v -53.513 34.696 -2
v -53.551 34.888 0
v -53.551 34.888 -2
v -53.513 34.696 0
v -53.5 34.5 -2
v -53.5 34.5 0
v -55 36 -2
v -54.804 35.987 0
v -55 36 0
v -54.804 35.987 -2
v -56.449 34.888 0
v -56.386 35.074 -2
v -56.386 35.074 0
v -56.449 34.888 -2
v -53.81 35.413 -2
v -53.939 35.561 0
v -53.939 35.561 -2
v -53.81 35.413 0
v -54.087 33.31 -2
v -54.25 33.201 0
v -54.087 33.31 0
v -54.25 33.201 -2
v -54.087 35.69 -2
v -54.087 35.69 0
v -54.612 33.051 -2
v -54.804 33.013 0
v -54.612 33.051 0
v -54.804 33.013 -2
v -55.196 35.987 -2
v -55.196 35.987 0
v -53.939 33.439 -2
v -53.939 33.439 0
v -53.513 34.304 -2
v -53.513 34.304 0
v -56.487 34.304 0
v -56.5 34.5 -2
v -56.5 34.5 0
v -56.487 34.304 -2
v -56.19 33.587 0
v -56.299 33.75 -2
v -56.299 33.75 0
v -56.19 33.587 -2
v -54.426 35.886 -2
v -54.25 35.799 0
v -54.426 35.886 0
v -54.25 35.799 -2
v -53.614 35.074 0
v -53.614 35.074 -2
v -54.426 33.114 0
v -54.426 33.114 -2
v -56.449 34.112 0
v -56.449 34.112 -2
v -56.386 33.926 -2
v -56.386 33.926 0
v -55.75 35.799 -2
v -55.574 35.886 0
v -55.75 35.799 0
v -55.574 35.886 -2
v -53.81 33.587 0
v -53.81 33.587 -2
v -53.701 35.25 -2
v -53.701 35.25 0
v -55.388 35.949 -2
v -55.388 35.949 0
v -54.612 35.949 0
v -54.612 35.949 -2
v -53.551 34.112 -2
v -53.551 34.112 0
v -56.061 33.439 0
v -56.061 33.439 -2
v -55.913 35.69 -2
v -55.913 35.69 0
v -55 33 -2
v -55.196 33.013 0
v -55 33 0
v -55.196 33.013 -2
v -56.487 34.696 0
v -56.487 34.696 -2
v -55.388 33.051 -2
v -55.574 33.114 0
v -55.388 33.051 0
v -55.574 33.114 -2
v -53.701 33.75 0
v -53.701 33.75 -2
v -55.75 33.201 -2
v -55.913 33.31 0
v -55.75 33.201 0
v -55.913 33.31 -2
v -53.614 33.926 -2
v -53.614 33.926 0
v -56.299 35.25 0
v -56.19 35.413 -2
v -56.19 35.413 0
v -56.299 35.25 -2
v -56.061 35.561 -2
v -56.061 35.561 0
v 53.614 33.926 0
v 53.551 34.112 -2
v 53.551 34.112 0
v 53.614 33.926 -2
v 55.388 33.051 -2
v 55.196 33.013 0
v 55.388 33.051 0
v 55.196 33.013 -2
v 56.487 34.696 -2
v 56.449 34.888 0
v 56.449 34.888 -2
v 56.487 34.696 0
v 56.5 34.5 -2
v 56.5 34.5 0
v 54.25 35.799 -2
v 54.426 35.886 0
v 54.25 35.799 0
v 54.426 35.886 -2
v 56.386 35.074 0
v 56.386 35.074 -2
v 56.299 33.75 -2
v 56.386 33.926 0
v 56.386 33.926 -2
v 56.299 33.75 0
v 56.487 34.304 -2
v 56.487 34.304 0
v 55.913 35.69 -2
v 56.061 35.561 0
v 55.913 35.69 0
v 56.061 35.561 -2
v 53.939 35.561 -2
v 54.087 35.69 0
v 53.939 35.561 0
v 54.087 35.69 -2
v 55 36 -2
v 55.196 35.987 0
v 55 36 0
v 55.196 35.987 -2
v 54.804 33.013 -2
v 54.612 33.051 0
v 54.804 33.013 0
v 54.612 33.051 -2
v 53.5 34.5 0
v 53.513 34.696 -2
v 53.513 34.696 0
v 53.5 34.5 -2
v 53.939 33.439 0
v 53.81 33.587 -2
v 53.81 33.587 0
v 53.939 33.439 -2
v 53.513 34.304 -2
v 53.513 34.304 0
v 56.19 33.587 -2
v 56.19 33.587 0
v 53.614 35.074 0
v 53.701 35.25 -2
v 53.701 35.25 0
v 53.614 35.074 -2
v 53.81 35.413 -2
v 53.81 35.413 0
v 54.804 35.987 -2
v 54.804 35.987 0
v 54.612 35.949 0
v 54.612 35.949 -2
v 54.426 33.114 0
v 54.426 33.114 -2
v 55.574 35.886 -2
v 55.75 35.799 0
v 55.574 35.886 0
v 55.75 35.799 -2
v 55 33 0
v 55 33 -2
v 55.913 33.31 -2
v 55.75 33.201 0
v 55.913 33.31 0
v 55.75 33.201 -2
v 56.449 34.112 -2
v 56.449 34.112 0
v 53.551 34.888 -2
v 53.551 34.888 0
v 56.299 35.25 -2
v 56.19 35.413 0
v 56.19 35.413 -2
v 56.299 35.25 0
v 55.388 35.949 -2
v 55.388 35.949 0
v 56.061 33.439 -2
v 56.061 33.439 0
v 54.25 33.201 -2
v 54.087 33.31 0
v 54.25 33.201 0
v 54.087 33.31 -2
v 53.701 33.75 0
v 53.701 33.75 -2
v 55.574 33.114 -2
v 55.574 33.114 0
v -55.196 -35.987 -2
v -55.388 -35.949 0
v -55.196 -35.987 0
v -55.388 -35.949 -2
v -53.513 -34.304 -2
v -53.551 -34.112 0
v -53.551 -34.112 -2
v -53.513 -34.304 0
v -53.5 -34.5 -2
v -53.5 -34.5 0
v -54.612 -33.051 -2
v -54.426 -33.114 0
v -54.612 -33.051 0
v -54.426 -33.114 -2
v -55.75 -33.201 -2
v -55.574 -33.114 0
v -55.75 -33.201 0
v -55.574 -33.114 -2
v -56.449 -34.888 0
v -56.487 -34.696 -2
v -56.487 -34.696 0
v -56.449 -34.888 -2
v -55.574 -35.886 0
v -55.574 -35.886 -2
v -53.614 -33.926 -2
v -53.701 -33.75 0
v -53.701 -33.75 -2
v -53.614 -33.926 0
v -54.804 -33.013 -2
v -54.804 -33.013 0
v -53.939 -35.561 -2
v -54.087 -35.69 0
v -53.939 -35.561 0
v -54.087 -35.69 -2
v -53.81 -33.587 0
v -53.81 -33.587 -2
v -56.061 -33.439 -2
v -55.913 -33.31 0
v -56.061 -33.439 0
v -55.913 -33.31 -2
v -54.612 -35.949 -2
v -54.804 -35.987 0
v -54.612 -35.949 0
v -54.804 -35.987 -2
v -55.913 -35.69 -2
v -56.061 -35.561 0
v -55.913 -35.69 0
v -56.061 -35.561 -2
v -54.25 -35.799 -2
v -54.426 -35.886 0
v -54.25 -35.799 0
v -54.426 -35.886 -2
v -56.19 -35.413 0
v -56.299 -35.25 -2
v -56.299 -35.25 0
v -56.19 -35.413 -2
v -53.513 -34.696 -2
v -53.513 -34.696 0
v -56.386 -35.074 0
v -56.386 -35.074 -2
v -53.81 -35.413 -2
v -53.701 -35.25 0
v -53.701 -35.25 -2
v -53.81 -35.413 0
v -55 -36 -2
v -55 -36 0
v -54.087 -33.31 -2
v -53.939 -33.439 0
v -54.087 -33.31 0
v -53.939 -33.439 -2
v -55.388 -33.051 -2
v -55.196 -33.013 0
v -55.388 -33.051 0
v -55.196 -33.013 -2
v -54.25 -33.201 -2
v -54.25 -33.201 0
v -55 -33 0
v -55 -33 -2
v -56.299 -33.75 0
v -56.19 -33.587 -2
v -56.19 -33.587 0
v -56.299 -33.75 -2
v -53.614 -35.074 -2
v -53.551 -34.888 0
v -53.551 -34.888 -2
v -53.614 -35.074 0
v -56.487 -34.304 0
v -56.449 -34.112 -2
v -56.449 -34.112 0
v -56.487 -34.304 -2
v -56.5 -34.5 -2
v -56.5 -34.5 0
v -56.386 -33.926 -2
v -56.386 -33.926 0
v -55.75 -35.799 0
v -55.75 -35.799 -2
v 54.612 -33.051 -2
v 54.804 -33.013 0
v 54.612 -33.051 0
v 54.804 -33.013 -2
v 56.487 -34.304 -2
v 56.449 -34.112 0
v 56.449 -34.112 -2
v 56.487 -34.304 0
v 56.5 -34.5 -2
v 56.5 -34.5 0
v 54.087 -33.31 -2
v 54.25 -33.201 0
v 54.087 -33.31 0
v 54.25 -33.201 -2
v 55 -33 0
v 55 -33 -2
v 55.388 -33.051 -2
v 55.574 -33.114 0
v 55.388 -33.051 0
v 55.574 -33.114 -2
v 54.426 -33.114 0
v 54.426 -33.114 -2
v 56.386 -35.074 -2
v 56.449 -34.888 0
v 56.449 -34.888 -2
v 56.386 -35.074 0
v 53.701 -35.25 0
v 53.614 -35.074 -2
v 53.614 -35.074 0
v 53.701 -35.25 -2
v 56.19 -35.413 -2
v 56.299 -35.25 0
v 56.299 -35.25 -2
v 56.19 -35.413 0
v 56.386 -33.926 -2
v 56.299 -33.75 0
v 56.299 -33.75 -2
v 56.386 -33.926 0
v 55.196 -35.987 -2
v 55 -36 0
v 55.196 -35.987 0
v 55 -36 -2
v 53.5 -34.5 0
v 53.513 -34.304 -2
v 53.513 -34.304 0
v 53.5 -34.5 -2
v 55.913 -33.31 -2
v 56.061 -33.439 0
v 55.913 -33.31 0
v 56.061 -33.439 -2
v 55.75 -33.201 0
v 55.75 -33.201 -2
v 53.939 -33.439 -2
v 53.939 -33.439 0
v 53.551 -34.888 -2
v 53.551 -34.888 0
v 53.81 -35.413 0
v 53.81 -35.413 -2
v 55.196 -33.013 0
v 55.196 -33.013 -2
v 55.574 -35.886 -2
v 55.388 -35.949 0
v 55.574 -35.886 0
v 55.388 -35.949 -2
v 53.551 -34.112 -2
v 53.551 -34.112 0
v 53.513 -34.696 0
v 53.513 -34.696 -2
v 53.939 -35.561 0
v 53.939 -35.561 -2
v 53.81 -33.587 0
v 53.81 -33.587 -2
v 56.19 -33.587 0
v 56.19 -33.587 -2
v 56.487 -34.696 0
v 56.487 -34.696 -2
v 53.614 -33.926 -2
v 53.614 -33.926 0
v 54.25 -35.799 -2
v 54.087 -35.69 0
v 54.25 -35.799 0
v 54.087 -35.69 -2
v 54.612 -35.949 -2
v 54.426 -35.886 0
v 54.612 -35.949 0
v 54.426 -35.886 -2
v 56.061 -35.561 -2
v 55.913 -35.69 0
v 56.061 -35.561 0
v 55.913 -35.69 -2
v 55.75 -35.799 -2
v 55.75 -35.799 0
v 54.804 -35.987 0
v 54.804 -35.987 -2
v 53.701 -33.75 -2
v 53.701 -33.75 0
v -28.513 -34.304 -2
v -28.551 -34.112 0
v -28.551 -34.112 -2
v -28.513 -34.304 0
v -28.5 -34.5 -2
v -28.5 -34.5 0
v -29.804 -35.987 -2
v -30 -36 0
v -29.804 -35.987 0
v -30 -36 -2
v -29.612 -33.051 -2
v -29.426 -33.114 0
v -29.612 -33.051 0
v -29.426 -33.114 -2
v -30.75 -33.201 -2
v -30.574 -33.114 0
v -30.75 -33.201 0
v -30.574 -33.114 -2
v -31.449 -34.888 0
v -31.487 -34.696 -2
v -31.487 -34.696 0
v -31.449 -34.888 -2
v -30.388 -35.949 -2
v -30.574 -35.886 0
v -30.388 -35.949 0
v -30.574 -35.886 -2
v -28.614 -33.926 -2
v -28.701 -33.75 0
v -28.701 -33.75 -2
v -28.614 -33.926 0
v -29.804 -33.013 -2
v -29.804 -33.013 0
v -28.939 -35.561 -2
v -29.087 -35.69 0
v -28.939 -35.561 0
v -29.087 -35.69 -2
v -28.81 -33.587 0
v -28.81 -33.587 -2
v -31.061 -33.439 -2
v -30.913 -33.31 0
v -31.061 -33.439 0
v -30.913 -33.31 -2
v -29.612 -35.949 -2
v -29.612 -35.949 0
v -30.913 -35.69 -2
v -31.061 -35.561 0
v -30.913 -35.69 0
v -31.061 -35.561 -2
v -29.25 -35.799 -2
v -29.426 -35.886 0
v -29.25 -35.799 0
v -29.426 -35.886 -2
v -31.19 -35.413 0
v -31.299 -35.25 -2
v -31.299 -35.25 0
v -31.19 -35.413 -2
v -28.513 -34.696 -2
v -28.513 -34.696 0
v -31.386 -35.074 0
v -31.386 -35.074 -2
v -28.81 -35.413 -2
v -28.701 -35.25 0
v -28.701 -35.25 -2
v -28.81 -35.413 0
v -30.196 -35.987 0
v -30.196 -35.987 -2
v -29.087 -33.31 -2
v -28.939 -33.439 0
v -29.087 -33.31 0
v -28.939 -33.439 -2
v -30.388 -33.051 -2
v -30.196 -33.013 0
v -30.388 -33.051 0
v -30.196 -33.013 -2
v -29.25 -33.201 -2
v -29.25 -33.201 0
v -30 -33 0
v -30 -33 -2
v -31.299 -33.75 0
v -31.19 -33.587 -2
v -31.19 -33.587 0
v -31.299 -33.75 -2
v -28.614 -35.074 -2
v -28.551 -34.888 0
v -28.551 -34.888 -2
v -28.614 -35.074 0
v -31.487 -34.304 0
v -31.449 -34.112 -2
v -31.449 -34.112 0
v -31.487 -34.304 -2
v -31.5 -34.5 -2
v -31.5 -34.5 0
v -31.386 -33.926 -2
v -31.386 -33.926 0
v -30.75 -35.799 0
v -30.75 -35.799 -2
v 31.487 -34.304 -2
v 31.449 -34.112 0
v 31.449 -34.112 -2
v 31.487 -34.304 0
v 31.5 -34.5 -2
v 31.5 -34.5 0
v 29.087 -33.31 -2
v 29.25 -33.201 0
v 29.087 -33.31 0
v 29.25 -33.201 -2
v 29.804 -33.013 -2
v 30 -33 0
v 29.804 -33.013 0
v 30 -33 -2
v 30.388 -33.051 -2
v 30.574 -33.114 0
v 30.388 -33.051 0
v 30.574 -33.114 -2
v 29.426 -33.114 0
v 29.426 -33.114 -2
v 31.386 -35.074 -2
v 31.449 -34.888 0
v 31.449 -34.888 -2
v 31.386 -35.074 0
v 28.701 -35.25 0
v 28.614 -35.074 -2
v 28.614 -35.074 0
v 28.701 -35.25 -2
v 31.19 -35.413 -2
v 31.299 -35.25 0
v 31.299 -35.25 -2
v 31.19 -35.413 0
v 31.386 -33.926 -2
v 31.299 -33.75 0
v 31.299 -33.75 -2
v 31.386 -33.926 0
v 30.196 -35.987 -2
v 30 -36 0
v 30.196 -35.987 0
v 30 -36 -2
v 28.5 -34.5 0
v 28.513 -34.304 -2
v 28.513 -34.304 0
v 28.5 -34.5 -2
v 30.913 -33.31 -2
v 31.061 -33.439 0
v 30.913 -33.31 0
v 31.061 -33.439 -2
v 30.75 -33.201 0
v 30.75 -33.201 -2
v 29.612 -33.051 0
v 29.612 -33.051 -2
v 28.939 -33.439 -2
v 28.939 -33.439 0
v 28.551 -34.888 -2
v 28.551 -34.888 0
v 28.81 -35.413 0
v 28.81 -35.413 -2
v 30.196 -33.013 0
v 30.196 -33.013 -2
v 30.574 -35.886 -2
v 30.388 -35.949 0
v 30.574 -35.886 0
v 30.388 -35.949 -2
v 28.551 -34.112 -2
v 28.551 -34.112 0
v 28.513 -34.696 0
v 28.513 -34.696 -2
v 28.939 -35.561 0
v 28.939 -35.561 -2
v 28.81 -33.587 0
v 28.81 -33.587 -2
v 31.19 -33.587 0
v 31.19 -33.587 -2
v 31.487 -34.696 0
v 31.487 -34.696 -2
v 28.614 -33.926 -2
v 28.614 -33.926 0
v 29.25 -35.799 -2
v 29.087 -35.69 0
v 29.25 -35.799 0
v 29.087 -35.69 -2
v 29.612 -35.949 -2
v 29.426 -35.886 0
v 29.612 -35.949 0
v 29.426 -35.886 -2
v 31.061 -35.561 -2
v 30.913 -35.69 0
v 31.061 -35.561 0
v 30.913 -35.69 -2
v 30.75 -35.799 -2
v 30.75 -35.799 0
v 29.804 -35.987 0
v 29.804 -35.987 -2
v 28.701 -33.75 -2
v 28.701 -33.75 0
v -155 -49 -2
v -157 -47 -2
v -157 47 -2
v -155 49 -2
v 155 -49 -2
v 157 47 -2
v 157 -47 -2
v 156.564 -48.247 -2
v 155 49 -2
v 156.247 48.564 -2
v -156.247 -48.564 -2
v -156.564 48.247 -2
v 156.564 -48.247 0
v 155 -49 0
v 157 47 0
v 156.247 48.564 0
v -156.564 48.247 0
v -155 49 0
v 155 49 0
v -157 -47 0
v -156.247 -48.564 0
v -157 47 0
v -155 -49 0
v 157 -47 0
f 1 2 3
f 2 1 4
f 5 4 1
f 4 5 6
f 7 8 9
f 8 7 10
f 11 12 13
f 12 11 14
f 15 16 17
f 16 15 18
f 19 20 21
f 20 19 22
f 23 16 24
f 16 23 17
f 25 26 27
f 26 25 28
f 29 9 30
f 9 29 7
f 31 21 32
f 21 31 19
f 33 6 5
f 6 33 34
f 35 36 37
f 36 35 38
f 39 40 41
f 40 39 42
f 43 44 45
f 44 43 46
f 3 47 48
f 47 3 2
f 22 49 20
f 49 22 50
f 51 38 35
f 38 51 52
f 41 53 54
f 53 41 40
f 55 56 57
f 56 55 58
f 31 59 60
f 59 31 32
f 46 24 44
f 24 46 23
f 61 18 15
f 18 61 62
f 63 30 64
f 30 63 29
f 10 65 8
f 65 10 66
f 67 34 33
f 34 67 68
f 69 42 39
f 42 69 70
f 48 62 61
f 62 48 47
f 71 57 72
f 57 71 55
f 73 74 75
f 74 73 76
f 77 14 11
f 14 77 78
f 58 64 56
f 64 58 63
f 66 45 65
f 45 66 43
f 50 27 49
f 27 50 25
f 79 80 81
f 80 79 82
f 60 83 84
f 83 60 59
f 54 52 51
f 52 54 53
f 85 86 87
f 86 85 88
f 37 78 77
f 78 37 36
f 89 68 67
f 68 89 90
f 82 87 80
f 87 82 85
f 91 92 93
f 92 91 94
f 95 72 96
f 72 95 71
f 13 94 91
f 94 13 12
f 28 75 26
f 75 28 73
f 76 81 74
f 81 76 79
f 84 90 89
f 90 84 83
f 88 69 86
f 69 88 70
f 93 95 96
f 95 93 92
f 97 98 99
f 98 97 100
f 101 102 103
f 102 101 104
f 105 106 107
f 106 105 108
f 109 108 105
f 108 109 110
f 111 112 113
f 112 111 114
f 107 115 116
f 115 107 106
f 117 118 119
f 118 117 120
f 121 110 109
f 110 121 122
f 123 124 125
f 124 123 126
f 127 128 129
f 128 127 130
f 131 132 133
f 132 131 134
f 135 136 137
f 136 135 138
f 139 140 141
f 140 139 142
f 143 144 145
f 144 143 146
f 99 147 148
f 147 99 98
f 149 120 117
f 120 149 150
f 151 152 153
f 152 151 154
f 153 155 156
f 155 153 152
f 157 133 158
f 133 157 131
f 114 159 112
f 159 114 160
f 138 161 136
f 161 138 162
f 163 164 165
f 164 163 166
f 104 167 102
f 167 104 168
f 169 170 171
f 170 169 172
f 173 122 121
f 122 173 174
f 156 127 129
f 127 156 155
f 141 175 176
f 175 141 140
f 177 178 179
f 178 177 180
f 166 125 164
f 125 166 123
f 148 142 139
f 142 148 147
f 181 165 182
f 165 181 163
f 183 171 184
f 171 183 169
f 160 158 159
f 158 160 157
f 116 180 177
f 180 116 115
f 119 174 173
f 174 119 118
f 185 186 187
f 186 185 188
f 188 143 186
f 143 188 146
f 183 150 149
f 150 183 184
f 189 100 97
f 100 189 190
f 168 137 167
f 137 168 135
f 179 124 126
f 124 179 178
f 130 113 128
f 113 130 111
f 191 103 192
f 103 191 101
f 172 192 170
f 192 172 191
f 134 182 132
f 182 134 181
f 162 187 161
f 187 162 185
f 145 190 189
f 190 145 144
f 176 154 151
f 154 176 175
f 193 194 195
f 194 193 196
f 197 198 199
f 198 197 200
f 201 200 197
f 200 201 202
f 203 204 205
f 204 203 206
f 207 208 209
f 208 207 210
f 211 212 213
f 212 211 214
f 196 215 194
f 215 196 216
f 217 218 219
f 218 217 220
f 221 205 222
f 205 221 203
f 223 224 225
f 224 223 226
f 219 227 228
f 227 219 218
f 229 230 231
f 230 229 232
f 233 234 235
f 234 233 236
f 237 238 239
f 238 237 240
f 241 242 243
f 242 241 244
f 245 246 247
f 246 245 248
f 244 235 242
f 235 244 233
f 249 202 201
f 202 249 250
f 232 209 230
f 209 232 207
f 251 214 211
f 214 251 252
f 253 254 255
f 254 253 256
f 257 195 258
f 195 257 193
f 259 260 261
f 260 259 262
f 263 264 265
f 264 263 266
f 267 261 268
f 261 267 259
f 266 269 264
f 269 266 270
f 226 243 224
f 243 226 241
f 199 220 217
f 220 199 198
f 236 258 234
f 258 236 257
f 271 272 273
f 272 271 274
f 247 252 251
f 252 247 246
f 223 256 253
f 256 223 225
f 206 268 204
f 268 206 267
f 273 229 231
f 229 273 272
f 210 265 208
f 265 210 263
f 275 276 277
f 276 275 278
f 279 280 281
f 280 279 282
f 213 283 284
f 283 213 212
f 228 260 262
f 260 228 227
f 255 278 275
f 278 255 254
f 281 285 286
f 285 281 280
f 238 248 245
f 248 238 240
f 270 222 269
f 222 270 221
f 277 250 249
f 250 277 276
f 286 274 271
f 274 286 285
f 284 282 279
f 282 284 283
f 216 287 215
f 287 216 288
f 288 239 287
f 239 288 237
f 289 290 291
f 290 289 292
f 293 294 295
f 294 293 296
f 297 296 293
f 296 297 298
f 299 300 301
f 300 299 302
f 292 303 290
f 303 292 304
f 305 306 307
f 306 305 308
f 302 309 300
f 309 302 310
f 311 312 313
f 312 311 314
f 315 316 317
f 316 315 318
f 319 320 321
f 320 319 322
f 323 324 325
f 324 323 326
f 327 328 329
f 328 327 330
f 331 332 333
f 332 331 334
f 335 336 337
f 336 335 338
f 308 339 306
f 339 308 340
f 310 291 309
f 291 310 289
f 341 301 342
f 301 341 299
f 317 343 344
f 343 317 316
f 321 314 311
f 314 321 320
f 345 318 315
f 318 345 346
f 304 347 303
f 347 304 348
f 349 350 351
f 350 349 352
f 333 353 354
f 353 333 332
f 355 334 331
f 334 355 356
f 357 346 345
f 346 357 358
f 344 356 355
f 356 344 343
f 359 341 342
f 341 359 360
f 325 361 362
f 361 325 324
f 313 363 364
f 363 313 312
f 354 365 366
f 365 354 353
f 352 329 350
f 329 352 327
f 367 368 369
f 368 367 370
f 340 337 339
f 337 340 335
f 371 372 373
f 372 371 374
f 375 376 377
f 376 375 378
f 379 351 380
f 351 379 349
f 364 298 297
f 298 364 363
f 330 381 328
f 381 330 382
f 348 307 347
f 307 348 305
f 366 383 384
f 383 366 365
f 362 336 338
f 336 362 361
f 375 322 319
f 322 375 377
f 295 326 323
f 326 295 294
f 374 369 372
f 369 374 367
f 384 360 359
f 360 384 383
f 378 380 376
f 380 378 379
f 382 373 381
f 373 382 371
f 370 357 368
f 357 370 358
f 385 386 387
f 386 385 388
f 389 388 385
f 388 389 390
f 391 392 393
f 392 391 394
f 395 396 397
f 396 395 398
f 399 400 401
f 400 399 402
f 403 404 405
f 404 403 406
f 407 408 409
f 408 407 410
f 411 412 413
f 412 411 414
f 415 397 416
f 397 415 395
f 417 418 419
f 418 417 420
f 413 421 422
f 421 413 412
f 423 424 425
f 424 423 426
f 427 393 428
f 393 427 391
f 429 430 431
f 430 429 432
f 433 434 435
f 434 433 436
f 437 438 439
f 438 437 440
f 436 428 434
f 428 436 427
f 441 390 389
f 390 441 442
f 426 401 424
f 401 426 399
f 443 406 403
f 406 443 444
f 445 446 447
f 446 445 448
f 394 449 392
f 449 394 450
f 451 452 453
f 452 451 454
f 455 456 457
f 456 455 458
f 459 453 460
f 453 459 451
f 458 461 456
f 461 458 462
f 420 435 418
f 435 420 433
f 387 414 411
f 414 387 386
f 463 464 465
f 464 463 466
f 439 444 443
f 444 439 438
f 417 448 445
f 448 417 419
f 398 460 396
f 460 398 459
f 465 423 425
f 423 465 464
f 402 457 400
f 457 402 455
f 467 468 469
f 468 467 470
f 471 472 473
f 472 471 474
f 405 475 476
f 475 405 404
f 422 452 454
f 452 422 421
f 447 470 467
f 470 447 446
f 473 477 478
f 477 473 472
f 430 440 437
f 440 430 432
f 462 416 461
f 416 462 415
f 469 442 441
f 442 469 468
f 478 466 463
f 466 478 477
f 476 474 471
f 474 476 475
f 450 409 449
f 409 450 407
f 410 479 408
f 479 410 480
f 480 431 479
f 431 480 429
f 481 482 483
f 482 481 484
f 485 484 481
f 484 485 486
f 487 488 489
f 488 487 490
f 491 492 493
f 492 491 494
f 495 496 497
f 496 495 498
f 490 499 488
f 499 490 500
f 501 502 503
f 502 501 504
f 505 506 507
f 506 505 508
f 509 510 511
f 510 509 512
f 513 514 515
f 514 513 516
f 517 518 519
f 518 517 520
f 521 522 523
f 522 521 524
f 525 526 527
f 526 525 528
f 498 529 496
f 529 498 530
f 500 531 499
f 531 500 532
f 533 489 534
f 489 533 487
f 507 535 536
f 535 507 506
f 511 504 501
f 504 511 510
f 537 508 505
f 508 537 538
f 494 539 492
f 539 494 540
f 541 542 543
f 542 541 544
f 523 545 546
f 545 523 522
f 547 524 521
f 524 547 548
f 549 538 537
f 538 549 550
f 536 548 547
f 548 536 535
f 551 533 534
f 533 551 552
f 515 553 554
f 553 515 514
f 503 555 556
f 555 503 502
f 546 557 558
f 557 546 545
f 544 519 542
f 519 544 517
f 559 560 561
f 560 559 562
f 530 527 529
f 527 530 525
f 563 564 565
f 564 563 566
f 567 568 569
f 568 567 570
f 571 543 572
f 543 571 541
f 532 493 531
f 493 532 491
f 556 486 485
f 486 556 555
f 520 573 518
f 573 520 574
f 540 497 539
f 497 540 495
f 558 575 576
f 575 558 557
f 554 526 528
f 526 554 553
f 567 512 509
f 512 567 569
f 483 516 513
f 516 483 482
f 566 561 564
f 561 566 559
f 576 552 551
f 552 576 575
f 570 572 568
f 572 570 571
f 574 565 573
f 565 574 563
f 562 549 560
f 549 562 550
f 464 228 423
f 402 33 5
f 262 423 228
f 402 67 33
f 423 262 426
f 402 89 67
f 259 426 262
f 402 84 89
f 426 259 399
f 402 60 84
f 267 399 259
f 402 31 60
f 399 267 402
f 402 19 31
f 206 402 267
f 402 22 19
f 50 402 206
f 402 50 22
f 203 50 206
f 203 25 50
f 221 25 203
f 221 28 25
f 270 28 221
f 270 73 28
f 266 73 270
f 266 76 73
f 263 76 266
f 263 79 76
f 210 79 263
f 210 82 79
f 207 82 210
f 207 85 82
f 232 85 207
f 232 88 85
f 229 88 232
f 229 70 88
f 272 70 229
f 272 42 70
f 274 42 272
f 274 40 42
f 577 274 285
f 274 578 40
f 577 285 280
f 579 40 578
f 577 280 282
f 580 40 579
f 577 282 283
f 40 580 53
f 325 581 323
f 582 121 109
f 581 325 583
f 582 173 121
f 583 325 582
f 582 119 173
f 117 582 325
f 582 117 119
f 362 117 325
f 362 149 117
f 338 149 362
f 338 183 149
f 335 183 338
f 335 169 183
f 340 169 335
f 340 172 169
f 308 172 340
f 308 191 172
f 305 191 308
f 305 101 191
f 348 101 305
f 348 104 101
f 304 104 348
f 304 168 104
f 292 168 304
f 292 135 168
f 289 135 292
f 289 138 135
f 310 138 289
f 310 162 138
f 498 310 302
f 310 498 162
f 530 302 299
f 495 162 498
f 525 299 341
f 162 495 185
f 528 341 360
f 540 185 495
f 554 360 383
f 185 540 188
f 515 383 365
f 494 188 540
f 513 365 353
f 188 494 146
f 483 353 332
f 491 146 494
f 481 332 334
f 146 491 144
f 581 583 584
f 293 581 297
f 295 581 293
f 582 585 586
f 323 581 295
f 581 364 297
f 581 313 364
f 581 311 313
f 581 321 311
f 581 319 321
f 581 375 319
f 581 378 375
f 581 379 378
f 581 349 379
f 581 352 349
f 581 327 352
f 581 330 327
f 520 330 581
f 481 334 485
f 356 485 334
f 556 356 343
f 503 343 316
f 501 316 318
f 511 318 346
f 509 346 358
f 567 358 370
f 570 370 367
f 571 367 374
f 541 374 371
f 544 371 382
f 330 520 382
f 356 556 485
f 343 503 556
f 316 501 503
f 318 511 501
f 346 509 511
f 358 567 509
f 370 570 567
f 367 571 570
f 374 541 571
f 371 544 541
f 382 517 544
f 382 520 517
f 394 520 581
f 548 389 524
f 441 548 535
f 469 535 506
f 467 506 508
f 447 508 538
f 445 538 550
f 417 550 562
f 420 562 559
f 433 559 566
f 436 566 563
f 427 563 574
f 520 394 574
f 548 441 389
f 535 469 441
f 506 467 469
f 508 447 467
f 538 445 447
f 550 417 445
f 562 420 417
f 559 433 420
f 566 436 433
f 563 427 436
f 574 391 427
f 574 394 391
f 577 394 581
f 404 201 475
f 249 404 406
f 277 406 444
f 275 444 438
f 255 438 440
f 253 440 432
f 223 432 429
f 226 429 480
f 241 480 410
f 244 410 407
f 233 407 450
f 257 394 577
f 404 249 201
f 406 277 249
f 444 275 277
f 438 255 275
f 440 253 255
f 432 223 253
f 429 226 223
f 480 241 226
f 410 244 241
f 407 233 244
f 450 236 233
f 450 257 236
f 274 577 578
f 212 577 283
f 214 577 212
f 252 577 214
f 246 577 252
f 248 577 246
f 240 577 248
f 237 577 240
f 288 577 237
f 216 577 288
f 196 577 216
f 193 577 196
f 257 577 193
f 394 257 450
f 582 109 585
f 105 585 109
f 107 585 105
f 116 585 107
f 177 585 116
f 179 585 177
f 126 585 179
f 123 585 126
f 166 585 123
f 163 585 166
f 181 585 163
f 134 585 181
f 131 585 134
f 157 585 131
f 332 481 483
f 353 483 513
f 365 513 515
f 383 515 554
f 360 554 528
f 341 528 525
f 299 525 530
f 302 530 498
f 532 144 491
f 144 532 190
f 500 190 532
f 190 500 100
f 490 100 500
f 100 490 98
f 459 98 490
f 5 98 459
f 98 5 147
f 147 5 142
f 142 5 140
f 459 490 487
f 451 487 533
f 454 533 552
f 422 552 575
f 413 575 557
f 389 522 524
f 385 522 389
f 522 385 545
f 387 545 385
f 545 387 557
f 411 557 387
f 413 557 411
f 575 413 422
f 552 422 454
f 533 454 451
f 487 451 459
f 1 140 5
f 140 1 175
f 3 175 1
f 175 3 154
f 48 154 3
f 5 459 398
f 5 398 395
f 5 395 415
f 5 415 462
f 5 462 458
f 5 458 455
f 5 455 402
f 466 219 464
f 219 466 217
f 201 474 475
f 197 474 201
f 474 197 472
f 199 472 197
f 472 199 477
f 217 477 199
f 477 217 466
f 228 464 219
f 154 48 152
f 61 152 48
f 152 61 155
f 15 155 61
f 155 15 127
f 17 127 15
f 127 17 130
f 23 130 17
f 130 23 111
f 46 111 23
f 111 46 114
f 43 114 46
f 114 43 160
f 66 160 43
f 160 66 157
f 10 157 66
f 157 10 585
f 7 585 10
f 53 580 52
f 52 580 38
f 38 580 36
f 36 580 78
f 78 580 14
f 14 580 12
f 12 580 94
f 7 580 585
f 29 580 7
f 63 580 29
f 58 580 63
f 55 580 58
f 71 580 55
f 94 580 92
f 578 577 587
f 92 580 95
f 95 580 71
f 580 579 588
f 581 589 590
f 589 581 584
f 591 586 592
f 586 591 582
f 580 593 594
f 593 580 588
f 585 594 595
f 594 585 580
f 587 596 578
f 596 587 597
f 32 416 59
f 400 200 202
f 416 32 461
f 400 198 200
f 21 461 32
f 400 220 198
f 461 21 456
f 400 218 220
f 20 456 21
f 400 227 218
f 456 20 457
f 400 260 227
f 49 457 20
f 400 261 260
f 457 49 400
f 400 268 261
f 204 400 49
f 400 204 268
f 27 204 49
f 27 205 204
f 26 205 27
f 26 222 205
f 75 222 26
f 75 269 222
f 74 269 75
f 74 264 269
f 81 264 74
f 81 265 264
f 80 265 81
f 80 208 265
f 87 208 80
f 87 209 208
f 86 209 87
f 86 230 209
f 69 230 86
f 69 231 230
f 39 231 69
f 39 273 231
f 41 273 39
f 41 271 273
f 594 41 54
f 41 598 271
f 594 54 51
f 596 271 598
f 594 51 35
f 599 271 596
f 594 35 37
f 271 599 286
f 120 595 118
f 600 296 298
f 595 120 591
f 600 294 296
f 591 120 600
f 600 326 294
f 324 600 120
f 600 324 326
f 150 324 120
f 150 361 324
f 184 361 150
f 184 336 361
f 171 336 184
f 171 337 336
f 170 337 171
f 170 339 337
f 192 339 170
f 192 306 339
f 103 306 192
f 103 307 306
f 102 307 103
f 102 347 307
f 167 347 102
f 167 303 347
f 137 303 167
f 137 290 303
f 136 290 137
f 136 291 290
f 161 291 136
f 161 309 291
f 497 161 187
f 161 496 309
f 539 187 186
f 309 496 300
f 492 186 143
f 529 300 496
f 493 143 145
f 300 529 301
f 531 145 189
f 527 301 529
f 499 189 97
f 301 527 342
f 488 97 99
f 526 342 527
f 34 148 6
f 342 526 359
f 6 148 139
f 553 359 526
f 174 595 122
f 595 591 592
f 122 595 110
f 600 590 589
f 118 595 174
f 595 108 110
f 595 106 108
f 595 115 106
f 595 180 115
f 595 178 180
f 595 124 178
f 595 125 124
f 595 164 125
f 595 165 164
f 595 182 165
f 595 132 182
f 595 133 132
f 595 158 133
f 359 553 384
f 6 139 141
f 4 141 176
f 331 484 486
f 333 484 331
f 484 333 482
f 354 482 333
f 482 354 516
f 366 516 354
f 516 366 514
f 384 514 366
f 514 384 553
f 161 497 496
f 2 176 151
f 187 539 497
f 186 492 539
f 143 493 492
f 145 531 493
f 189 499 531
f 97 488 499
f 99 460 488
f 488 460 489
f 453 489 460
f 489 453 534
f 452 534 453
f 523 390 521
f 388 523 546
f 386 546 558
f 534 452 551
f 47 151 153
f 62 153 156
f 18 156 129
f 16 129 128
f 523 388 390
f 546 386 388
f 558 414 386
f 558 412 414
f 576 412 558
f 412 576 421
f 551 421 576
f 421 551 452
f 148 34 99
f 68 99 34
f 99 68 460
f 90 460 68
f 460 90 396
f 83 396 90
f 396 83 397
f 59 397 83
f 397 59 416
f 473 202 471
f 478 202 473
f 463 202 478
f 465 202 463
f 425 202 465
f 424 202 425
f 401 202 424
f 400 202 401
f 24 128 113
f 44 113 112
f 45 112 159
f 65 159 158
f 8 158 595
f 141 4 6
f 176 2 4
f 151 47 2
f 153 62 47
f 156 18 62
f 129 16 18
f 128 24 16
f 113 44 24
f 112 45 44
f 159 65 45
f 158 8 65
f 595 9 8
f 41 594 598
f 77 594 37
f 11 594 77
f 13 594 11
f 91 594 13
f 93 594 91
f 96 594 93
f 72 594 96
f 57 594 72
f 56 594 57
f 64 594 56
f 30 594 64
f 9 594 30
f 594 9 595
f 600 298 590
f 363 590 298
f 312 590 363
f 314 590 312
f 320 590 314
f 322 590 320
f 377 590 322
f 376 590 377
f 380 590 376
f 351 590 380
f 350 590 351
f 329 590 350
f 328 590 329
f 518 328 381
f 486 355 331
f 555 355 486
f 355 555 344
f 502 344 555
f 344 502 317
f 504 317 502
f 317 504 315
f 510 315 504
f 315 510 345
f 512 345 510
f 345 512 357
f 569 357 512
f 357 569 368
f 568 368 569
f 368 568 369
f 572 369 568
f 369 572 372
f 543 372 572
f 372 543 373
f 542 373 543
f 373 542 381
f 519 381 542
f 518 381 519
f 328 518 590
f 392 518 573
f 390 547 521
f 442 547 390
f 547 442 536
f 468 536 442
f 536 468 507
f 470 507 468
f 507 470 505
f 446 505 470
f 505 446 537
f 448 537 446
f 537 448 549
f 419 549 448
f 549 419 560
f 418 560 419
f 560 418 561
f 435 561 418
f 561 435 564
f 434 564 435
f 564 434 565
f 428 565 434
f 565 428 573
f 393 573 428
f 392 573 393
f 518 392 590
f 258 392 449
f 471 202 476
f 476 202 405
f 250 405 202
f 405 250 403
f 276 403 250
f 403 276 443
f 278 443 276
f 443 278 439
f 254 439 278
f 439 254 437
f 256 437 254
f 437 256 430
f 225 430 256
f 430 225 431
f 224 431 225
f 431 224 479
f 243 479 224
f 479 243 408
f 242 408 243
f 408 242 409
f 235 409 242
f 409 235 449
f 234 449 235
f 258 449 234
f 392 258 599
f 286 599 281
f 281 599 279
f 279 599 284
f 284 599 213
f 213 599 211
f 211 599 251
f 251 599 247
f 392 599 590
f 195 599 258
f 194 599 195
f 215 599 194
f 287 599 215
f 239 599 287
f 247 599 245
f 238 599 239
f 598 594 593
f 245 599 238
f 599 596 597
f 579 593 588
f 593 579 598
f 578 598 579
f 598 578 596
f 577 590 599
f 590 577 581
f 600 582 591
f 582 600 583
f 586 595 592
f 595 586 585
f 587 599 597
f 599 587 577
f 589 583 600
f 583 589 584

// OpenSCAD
// S200 front beam face holes (mm)
// Origin: plate center. +X right, +Y up.
// Measured from drawing: 310×94 plate, 110×69 for 4×Ø3, plus two bottom M3.
plate_l = 310;
plate_h = 94;
hole_d = 3;

// 4×Ø3 (110 × 69)
cad_4x = [
  [-55,  34.5], [55,  34.5],
  [-55, -34.5], [55, -34.5]
];

// Two extra M3 on bottom row only (inside 110 span) — measured ≈±30.15, rounded to ±30
extra_bottom_m3 = [
  [-30, -34.5], [30, -34.5]
];

module plate() {
  translate([0,0,-2]) linear_extrude(2) offset(r=2) square([plate_l, plate_h], center=true);
}
module holes(list) {
  for (p = list) translate([p[0], p[1], -3]) cylinder(h=6, d=hole_d, $fn=48);
}

difference() {
  plate();
  holes(cad_4x);
  holes(extra_bottom_m3);
}
